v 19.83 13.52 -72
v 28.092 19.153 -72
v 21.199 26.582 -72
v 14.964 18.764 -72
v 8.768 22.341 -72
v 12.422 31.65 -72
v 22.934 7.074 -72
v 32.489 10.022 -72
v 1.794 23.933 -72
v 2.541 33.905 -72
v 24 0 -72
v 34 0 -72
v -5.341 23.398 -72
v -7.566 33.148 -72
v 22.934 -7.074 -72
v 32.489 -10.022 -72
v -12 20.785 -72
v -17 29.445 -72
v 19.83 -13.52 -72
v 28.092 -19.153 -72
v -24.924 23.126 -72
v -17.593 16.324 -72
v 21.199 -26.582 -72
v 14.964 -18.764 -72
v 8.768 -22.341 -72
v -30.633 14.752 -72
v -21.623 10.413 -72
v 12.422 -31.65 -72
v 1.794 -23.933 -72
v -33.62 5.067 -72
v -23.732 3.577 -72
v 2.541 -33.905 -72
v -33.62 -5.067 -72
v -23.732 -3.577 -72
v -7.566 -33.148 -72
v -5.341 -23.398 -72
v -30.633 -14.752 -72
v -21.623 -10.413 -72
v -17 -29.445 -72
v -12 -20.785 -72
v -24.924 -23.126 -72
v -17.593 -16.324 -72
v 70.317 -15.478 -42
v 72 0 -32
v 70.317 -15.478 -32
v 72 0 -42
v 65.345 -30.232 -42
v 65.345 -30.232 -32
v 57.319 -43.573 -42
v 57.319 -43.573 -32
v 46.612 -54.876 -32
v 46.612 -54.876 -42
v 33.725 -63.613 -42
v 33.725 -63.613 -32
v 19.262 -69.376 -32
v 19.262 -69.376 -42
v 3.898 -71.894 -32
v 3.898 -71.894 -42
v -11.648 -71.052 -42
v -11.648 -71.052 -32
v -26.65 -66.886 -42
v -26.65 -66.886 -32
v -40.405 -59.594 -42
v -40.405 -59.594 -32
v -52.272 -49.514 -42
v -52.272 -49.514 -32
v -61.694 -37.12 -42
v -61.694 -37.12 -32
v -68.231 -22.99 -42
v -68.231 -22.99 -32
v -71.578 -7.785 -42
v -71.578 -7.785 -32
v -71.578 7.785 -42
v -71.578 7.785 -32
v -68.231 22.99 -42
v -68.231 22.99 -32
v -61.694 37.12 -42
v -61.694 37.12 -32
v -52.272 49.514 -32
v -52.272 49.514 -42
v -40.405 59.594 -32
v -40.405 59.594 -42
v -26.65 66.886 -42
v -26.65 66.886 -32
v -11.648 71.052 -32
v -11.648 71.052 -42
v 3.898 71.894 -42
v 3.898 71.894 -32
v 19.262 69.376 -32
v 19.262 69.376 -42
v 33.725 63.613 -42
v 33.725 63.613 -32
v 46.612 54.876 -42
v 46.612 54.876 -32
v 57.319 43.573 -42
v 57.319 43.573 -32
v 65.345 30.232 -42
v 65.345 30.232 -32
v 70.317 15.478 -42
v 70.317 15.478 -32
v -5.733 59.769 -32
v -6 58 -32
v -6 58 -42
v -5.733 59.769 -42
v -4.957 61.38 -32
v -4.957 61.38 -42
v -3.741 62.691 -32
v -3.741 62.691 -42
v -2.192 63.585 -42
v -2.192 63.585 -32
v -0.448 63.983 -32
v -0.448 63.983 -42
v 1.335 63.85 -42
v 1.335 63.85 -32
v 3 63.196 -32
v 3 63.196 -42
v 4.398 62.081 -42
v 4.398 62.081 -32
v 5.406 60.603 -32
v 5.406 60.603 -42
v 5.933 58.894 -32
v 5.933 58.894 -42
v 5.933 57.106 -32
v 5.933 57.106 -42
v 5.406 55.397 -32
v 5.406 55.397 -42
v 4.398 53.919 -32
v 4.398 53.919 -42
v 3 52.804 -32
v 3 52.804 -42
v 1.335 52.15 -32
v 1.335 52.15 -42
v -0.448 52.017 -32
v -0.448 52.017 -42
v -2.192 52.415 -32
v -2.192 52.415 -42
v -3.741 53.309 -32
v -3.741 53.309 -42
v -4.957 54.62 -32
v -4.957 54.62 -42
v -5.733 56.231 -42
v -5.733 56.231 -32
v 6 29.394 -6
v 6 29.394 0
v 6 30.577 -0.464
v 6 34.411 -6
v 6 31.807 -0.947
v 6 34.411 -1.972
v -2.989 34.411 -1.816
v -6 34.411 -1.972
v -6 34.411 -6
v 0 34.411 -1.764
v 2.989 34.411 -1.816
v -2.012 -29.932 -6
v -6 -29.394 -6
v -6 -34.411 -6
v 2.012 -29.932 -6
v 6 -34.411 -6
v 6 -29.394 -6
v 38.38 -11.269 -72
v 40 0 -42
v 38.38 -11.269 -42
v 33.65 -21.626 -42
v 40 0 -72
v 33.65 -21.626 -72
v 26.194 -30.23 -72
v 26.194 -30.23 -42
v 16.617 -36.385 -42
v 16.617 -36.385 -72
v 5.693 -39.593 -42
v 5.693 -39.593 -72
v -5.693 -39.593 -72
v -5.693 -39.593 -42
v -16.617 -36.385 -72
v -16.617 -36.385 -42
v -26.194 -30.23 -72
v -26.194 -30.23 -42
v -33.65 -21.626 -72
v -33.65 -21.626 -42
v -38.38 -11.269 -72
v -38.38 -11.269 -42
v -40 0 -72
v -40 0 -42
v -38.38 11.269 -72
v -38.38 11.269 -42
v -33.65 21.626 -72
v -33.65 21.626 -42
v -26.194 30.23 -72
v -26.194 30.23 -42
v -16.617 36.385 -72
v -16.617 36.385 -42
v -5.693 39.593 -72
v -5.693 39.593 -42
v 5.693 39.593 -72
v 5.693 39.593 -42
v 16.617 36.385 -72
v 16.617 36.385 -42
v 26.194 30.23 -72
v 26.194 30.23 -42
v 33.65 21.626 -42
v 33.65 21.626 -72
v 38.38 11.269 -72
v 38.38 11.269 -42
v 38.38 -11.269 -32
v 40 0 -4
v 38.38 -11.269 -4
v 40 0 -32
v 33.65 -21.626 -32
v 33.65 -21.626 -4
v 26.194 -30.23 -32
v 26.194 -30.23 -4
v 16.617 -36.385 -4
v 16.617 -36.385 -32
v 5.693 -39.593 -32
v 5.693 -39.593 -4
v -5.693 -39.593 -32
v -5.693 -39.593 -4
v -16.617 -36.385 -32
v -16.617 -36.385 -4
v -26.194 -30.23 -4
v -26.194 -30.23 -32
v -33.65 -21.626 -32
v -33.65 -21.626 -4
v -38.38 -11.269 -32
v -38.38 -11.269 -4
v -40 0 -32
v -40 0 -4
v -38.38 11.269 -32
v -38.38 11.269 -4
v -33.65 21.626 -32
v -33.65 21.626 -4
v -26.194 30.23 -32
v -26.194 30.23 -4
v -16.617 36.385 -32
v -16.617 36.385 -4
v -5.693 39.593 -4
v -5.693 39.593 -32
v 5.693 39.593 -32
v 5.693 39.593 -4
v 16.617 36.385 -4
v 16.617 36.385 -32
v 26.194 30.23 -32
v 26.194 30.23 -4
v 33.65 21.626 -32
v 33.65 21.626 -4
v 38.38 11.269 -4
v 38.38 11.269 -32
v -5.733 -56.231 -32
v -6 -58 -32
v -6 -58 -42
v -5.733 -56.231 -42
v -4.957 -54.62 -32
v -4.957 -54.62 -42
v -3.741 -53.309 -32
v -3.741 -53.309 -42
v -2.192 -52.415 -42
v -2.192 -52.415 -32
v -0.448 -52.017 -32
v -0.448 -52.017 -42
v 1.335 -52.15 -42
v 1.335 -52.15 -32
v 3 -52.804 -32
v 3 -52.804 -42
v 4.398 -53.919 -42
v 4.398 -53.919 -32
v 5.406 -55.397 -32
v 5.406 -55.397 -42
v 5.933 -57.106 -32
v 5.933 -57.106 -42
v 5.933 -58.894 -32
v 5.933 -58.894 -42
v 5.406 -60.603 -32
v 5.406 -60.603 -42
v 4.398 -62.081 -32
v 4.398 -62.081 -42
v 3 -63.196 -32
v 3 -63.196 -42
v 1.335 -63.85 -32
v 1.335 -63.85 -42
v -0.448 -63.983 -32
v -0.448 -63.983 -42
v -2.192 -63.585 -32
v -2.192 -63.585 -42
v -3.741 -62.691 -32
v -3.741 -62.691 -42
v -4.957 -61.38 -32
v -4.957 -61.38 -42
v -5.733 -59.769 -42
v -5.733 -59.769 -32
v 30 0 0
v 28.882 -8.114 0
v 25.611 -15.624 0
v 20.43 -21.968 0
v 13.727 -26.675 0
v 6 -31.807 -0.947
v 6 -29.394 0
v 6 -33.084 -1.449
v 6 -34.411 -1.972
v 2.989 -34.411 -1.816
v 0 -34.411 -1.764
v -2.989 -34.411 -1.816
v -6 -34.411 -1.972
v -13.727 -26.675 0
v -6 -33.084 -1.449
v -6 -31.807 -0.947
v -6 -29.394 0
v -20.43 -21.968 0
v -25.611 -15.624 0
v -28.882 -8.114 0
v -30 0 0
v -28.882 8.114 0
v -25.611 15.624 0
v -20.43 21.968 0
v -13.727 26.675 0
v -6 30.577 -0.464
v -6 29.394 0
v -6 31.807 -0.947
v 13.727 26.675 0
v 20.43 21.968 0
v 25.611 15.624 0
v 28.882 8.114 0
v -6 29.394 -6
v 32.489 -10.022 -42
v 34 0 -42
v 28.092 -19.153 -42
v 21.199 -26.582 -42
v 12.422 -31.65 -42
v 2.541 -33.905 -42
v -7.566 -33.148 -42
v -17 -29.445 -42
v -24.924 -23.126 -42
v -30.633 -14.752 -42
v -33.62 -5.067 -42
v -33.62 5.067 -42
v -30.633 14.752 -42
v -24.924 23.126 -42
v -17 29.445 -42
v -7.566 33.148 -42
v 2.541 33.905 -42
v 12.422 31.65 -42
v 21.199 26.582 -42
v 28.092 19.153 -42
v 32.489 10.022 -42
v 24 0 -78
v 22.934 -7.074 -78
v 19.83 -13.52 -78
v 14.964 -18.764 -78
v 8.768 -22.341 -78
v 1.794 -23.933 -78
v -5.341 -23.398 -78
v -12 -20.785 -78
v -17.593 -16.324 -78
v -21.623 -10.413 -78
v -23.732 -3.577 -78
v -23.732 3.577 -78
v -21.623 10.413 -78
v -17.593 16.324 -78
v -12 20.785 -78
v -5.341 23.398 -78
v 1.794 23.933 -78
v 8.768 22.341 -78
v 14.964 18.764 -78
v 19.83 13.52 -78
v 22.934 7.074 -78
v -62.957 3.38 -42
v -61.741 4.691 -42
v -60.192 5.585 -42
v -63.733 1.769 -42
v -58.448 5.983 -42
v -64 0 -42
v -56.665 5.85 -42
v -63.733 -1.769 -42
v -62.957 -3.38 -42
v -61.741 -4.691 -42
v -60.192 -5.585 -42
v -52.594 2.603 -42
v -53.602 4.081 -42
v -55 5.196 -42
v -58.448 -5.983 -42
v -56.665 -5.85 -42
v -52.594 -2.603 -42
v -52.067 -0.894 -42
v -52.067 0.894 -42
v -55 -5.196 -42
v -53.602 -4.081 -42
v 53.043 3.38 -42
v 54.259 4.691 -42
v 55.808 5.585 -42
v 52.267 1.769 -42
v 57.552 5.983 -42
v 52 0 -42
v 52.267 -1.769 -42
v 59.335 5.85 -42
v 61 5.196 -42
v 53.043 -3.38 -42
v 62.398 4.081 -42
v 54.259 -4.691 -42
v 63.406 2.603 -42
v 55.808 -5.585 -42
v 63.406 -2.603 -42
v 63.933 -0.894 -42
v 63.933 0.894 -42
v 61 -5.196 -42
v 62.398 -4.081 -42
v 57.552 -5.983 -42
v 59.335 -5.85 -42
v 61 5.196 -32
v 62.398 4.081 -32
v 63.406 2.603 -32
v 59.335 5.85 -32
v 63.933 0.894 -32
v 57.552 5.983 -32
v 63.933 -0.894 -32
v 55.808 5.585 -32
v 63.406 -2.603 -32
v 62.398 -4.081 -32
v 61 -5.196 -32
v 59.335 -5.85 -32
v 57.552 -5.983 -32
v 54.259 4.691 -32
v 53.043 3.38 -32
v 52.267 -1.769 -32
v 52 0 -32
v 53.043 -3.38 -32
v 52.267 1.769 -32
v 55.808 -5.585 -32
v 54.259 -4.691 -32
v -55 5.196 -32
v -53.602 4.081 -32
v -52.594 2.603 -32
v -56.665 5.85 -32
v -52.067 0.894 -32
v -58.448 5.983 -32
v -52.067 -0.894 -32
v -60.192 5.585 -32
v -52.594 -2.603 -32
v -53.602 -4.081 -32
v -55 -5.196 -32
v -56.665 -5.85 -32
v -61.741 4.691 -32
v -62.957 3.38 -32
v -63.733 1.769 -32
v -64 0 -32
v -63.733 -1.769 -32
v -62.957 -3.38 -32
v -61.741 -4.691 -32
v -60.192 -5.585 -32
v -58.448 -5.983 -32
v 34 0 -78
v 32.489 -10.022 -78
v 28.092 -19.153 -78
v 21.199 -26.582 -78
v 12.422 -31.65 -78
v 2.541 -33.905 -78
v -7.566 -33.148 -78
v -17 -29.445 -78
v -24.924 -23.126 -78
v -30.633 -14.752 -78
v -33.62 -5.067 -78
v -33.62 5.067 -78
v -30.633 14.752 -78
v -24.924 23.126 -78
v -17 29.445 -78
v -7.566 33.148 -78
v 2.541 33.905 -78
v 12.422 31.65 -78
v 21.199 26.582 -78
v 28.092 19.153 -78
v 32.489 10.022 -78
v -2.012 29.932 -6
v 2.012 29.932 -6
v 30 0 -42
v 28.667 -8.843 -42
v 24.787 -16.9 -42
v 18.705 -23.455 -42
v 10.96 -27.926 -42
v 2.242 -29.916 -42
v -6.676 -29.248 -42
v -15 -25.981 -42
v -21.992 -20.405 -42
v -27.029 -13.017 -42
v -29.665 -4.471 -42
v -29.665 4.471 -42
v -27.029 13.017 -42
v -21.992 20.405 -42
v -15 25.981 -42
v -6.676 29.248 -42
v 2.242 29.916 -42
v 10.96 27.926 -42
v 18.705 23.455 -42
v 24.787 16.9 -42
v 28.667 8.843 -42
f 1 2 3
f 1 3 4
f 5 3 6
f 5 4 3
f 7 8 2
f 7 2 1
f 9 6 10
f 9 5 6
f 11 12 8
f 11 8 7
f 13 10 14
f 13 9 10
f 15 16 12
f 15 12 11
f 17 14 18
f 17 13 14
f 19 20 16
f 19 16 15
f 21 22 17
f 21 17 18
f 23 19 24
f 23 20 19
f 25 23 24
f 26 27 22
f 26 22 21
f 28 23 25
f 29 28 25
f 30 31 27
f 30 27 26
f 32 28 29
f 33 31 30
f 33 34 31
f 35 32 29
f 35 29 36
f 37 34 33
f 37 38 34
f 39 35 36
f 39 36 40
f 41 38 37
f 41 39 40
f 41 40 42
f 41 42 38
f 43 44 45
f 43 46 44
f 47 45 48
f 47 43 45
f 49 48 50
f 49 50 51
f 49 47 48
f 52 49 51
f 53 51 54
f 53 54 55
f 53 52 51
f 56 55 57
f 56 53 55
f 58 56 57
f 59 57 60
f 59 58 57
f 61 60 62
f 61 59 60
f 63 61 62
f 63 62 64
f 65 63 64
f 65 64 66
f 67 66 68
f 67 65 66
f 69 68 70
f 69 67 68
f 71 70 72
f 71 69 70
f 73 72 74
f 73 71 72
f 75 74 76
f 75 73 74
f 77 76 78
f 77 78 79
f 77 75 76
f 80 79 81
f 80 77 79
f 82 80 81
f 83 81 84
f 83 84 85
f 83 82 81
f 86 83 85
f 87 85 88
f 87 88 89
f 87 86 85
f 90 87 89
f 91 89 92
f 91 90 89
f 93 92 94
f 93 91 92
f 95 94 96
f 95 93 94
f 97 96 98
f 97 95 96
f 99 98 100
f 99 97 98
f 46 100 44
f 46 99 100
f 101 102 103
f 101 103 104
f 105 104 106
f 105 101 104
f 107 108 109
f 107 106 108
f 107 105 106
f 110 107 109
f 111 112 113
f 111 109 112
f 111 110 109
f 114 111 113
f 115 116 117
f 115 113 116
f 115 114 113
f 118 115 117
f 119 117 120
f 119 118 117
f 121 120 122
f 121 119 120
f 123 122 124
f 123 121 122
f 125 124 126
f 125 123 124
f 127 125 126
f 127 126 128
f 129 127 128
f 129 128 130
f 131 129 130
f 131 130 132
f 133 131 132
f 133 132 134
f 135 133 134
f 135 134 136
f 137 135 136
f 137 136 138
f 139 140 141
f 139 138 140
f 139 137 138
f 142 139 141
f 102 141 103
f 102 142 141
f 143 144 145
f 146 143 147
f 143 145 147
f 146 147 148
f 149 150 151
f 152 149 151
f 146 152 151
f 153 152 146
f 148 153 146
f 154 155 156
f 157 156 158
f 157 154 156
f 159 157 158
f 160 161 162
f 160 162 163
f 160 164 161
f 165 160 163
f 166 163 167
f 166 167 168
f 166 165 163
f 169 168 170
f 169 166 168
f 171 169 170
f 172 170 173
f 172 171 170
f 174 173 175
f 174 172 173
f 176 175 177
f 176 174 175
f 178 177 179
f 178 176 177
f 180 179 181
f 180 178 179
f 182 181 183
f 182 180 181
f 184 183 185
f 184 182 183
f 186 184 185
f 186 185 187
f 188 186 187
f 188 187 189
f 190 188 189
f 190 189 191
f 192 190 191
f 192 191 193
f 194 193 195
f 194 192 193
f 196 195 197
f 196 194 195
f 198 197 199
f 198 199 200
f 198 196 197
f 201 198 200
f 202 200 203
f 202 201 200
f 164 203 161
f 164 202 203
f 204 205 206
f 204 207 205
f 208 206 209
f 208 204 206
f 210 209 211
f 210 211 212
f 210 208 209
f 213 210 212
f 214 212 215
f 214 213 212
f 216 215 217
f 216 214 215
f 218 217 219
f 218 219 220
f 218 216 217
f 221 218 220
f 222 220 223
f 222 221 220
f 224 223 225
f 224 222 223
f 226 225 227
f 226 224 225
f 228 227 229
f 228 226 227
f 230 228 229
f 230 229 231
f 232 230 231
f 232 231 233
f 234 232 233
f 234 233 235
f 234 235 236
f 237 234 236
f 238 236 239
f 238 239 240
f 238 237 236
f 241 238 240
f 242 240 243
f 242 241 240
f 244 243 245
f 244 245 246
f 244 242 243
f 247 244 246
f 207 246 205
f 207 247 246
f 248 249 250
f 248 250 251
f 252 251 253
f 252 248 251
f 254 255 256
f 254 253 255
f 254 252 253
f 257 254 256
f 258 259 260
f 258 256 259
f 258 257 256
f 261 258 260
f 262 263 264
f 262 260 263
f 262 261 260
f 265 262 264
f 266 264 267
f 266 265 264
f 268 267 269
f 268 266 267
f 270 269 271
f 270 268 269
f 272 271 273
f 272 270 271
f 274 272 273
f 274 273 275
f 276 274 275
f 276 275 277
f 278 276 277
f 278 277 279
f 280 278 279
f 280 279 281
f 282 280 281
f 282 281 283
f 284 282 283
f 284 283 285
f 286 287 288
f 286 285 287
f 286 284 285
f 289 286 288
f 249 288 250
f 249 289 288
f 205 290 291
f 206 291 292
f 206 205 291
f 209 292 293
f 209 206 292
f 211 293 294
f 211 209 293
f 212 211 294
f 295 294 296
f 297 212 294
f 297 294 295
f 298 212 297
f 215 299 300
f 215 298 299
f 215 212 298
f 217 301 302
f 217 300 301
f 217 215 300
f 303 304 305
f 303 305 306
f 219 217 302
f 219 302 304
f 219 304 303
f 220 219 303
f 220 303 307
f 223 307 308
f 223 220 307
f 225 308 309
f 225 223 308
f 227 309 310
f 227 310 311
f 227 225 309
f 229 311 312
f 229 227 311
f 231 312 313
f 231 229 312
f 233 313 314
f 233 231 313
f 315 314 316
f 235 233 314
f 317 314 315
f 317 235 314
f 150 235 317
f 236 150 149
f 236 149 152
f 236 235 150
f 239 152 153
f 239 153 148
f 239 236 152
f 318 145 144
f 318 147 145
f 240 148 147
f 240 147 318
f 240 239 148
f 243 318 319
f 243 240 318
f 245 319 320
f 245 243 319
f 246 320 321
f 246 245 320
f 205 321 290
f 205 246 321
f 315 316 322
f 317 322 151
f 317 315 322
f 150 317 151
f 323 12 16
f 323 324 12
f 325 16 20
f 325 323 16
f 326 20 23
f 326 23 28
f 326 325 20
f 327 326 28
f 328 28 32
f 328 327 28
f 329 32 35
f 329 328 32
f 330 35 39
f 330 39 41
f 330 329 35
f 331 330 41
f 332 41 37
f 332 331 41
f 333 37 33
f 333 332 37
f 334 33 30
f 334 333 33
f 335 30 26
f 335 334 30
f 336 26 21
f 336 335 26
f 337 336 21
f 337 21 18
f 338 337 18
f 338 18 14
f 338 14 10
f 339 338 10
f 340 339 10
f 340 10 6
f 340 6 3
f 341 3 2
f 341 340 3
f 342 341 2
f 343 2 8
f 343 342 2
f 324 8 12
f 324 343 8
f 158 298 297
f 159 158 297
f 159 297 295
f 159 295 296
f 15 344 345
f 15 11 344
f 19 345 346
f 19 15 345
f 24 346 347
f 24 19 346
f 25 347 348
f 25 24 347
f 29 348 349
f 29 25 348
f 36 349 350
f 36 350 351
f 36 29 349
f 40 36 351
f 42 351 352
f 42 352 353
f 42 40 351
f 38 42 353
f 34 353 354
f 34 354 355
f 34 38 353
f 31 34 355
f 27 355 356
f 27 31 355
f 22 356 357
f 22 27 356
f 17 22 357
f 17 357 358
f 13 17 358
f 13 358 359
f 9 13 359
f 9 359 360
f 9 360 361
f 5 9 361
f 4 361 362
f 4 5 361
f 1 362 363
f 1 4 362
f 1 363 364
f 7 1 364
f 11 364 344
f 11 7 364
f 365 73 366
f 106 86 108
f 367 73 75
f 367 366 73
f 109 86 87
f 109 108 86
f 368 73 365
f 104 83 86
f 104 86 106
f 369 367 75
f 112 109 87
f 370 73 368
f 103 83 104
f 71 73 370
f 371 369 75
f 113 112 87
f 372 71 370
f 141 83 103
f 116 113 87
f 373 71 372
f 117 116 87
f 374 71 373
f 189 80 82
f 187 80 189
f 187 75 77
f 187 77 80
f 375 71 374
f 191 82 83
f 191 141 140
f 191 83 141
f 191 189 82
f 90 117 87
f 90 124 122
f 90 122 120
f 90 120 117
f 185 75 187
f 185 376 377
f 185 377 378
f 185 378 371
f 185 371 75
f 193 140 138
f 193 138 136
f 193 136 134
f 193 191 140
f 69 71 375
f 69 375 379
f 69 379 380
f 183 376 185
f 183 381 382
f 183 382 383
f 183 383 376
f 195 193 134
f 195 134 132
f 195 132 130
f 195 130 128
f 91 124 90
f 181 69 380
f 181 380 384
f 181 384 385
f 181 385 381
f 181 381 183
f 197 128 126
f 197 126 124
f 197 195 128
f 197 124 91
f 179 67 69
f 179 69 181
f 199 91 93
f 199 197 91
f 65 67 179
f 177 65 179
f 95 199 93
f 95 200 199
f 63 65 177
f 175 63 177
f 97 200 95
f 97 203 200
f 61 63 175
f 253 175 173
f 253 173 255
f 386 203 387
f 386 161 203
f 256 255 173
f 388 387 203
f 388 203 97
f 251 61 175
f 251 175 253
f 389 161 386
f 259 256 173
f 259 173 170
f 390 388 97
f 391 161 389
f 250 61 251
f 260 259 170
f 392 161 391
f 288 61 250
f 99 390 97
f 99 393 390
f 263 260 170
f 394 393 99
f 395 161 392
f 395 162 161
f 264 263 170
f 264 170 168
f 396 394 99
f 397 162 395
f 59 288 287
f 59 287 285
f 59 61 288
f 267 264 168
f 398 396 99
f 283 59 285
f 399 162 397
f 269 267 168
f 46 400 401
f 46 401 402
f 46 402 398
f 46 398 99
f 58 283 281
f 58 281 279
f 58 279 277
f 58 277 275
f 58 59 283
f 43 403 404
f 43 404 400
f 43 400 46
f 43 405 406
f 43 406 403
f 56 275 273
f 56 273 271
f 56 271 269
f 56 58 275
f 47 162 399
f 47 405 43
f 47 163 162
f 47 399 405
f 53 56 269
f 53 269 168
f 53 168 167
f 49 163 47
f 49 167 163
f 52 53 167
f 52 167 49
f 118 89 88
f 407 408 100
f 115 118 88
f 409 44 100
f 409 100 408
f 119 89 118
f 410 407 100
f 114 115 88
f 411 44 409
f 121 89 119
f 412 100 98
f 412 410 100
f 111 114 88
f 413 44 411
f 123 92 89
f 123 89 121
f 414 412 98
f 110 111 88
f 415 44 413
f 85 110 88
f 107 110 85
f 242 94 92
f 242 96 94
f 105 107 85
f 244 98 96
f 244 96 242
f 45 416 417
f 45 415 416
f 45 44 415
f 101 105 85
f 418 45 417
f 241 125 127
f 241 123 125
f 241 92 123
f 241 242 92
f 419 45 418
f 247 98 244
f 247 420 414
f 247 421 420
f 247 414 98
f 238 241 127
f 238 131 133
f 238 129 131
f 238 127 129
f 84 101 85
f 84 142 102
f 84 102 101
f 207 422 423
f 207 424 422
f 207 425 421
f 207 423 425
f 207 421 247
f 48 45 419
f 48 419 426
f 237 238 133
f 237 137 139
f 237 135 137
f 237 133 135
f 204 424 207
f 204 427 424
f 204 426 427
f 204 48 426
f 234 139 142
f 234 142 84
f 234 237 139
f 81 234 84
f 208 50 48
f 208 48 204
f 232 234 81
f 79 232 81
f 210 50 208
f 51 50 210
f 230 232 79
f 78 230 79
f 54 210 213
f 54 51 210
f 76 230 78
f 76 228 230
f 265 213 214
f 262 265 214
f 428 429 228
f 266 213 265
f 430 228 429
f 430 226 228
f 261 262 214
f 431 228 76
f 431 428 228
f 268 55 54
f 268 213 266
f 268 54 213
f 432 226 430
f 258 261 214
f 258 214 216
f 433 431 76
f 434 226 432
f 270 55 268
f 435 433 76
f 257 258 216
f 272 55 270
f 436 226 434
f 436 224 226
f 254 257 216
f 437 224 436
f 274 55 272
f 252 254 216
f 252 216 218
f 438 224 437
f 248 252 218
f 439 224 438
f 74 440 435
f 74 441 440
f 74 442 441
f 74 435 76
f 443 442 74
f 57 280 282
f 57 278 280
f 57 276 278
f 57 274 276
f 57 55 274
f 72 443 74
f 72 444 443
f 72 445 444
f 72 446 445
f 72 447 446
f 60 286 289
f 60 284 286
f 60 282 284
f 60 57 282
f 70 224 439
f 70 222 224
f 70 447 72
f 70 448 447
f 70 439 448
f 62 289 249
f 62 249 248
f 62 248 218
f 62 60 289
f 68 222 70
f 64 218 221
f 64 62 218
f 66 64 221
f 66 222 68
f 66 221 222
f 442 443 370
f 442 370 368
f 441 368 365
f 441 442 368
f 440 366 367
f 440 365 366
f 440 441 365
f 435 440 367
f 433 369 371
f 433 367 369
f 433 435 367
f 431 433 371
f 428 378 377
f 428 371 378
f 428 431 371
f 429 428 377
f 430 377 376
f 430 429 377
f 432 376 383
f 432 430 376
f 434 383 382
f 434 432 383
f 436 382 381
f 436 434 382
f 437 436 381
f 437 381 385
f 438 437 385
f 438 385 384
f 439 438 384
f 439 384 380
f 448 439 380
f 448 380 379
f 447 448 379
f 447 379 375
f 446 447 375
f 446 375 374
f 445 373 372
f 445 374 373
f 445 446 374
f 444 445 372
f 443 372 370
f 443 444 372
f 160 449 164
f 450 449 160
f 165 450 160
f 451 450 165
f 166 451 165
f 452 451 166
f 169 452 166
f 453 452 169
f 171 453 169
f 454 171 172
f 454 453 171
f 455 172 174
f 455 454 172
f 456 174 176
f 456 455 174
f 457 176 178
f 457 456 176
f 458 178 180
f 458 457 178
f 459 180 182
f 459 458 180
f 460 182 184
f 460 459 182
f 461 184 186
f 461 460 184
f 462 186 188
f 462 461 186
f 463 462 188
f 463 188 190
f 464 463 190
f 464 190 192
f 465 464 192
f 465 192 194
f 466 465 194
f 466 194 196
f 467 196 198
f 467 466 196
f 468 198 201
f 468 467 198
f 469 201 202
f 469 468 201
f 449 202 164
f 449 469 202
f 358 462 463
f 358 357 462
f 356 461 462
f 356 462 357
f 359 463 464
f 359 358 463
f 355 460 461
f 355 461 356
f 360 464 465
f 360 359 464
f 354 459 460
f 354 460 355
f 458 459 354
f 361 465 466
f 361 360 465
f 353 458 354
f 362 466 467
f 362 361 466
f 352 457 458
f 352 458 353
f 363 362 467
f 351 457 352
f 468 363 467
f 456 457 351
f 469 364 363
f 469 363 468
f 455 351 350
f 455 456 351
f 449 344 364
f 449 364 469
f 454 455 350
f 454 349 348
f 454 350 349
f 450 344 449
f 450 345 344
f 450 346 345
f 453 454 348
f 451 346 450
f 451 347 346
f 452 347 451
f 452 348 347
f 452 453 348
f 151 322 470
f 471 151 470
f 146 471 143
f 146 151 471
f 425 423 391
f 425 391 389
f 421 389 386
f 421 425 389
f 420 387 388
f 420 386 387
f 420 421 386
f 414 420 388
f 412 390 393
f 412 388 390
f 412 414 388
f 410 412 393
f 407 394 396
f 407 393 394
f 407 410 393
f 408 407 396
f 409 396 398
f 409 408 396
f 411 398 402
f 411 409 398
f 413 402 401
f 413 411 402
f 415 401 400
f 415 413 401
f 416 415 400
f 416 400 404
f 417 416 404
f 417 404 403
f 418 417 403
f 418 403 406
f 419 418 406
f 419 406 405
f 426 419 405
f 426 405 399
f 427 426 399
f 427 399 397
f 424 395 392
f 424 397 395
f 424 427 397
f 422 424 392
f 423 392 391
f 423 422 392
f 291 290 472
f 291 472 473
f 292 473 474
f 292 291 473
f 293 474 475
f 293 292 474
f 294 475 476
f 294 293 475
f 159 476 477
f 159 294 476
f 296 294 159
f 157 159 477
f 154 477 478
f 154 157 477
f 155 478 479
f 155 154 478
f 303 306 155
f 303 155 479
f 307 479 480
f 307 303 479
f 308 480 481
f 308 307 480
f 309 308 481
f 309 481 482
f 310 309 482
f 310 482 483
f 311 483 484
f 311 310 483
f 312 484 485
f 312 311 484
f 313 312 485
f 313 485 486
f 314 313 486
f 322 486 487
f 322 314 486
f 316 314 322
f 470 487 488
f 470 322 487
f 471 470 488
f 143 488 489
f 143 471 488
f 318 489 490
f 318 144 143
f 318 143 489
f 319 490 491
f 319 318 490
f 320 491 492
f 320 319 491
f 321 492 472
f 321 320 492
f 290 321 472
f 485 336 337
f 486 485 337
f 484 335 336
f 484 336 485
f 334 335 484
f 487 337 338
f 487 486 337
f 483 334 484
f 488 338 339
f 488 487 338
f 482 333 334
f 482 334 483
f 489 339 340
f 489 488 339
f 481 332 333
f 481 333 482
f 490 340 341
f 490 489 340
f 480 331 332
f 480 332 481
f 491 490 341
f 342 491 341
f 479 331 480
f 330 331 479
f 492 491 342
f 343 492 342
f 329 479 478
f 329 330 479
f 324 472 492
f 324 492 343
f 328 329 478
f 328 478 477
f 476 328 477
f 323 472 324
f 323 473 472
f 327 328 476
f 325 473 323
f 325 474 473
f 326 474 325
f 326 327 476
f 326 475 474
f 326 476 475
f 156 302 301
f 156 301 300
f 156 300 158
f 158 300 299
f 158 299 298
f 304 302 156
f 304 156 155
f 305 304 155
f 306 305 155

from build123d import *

# Parameters (mm, degrees)
CUT_EXTRUDE1_DEPTH      = 111.145358504
CUT_EXTRUDE1_DEPTH_BACK = 111.145358504
SKETCH2_R               = 6
SKETCH5_W               = 12
SKETCH5_H               = 8.82137068
CUT_EXTRUDE3_DEPTH      = 6


with BuildPart() as part:
    # Sketch1 → Revolve1 (revolve)
    with BuildSketch(Plane(origin=(0, 0, 0), x_dir=(1, 0, 0), z_dir=(0, 1, 0))):
        Polygon((24, 78), (24, 72), (34, 72), (34, 42), (30, 42), (30, 0), (40, 4), (40, 32), (72, 32), (72, 42), (40, 42), (40, 72), (34, 78), align=None)
    revolve(axis=Axis((0, 0, 0), (0, 0, -1)))

    # Sketch2 → Cut-Extrude1 (cut, two sides: drawn at the far end of the back side and taken through both)
    with BuildSketch(Plane(origin=(0, 0, -42), x_dir=(-1, 0, 0), z_dir=(0, 0, -1)).offset(-CUT_EXTRUDE1_DEPTH_BACK)):
        with Locations((0, 58)):
            Circle(SKETCH2_R)
        with Locations((58, 0)):
            Circle(SKETCH2_R)
        with Locations((0, -58)):
            Circle(SKETCH2_R)
        with Locations((-58, 0)):
            Circle(SKETCH2_R)
    extrude(amount=CUT_EXTRUDE1_DEPTH + CUT_EXTRUDE1_DEPTH_BACK, mode=Mode.SUBTRACT)

    # Sketch5 → Cut-Extrude3 (cut)
    with BuildSketch(Plane.XY):
        with Locations((0, 30)):
            Rectangle(SKETCH5_W, SKETCH5_H)
        with Locations((0, -30)):
            Rectangle(SKETCH5_W, SKETCH5_H)
    extrude(amount=-CUT_EXTRUDE3_DEPTH, mode=Mode.SUBTRACT)


solid = part.part
